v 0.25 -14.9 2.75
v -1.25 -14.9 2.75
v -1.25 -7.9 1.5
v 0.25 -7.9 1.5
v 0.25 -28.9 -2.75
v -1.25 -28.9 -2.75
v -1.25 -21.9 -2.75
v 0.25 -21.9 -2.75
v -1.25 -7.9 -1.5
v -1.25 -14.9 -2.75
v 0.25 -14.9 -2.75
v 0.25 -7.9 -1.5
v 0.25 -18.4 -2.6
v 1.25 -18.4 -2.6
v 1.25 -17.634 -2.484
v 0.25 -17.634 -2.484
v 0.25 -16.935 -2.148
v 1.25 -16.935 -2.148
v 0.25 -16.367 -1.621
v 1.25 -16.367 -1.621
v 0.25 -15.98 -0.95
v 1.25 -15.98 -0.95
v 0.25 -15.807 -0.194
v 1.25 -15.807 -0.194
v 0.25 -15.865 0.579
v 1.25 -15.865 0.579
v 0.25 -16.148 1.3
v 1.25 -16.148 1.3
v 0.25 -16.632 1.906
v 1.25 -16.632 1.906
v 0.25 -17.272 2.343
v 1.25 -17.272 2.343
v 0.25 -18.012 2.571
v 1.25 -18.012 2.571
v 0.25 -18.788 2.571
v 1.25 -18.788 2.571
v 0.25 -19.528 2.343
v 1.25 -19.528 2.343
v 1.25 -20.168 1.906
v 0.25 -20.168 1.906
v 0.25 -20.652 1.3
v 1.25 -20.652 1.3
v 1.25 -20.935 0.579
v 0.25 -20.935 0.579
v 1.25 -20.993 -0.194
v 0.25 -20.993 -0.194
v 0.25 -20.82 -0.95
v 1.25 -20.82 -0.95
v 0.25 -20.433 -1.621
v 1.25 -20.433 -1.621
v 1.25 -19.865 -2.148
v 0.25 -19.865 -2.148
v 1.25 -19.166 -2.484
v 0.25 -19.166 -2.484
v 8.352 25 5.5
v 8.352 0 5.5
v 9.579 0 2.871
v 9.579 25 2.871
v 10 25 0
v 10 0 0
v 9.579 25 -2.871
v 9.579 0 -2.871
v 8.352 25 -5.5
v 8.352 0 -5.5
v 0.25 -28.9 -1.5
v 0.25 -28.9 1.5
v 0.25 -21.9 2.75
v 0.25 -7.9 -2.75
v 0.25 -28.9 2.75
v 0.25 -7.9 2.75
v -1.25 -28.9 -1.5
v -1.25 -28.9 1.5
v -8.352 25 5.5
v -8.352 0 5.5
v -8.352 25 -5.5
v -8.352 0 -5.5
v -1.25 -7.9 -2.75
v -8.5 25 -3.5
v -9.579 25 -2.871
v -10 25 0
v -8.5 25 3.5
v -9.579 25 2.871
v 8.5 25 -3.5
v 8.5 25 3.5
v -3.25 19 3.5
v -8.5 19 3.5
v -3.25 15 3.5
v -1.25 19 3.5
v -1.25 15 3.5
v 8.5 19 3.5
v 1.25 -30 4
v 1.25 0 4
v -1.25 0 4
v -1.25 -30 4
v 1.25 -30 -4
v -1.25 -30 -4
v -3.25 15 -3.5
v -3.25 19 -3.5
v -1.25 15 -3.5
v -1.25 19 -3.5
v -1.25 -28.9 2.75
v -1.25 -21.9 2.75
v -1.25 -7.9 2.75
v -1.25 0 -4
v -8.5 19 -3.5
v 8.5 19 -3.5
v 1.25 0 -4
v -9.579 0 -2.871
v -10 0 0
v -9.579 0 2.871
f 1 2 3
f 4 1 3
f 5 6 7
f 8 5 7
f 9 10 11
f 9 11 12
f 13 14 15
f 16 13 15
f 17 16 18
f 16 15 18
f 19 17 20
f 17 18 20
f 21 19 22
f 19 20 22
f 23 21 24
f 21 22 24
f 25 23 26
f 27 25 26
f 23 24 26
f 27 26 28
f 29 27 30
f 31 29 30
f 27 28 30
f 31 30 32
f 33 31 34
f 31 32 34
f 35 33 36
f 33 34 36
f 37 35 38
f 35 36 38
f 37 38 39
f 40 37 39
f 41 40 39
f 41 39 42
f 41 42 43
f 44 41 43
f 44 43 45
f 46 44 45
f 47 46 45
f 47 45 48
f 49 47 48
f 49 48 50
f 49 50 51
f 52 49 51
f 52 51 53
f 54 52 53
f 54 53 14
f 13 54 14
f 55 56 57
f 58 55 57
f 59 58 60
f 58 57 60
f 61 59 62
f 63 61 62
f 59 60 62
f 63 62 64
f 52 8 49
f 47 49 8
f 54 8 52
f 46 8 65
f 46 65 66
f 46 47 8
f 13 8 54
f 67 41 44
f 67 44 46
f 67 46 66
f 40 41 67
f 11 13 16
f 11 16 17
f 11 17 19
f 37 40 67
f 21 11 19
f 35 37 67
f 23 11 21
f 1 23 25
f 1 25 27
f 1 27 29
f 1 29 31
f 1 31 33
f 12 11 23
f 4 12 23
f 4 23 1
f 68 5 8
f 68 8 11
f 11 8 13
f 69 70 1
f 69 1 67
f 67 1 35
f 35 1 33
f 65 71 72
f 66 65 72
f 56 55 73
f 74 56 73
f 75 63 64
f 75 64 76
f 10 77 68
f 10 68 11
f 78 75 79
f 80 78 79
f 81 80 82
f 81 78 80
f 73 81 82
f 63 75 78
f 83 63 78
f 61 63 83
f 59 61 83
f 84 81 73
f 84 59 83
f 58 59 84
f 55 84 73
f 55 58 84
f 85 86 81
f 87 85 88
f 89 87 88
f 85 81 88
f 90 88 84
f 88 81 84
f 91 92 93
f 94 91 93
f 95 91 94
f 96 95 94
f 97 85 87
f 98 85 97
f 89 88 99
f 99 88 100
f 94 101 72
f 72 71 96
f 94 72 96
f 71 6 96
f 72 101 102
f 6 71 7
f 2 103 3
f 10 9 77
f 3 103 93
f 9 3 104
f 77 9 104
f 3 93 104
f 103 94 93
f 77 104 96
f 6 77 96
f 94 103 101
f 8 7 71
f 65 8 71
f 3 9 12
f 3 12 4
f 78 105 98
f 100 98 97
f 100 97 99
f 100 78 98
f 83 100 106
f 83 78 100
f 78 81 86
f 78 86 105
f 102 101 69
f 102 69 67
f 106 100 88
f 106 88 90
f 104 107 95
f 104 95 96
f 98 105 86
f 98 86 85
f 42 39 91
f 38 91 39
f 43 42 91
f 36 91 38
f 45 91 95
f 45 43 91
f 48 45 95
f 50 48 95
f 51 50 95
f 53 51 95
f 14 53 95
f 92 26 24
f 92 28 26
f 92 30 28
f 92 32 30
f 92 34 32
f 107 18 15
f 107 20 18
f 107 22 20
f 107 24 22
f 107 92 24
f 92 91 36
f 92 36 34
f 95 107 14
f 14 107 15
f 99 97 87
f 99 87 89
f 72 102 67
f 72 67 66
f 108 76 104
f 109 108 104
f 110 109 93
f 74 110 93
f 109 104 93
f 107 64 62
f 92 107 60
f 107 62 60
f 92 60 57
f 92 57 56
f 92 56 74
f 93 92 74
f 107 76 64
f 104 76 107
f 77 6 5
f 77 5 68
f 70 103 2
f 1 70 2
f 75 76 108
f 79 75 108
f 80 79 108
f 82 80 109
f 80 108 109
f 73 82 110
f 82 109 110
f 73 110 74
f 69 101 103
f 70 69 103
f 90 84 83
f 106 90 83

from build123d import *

# Parameters (mm, degrees)
SKETCH3_R           = 10
BOSS_EXTRUDE1_DEPTH = 25
SKETCH4_W           = 2.5
SKETCH4_H           = 8
BOSS_EXTRUDE2_DEPTH = 30
CUT_EXTRUDE1_REACH  = 35.564
SKETCH5_R           = 2.6
SKETCH7_W           = 17
SKETCH7_H           = 7
CUT_EXTRUDE3_DEPTH  = 6
SKETCH8_W           = 2
SKETCH8_H           = 7
CUT_EXTRUDE4_DEPTH  = 4
SKETCH11_W          = 5.5
SKETCH11_H          = 21
CUT_EXTRUDE7_DEPTH  = 1.5
CUT_EXTRUDE5_DEPTH  = 43
BOSS_EXTRUDE3_DEPTH = 1.5


with BuildPart() as part:
    # Sketch3 → Boss-Extrude1 (new body)
    with BuildSketch(Plane(origin=(0, 0, 0), x_dir=(1, 0, 0), z_dir=(0, 1, 0))):
        with Locations(Location((0, 0, 0), (0, 0, 270))):
            Circle(SKETCH3_R)
    extrude(amount=BOSS_EXTRUDE1_DEPTH)

    # Sketch4 → Boss-Extrude2 (add)
    with BuildSketch(Plane(origin=(0, 0, 0), x_dir=(-1, 0, 0), z_dir=(0, -1, 0))):
        Rectangle(SKETCH4_W, SKETCH4_H)
    extrude(amount=BOSS_EXTRUDE2_DEPTH)

    # Sketch5 → Cut-Extrude1 (cut, up to next)
    with BuildSketch(Plane(origin=(1.25, 0, 0), x_dir=(0, 0, -1), z_dir=(1, 0, 0)), mode=Mode.PRIVATE) as cut_extrude1_sk1:
        with Locations((0, -18.4)):
            Circle(SKETCH5_R)
    cut_extrude1_tool1 = extrude(cut_extrude1_sk1.sketch, amount=-CUT_EXTRUDE1_REACH, mode=Mode.PRIVATE) & part.part
    add(cut_extrude1_tool1.solids().sort_by_distance((1.25, -18.4, 0))[0], mode=Mode.SUBTRACT)

    # Sketch7 → Cut-Extrude3 (cut)
    with BuildSketch(Plane(origin=(0, 25, 0), x_dir=(1, 0, 0), z_dir=(0, 1, 0))):
        Rectangle(SKETCH7_W, SKETCH7_H)
    extrude(amount=-CUT_EXTRUDE3_DEPTH, mode=Mode.SUBTRACT)

    # Sketch8 → Cut-Extrude4 (cut)
    with BuildSketch(Plane(origin=(0, 19, 0), x_dir=(1, 0, 0), z_dir=(0, 1, 0))):
        with Locations((-2.25, 0)):
            Rectangle(SKETCH8_W, SKETCH8_H)
    extrude(amount=-CUT_EXTRUDE4_DEPTH, mode=Mode.SUBTRACT)

    # Sketch11 → Cut-Extrude7 (cut)
    with BuildSketch(Plane.ZY.offset(1.25)):
        with Locations((0, -18.4)):
            Rectangle(SKETCH11_W, SKETCH11_H)
    extrude(amount=-CUT_EXTRUDE7_DEPTH, mode=Mode.SUBTRACT)

    # Sketch9 → Cut-Extrude5 (cut)
    with BuildSketch(Plane.XZ):
        with BuildLine():
            Line((8.351646544, -5.5), (-8.351646544, -5.5))
            ThreePointArc((-8.351646544, -5.5), (0, -10), (8.351646544, -5.5))
        make_face()
        with BuildLine():
            Line((8.351646544, 5.5), (-8.351646544, 5.5))
            ThreePointArc((-8.351646544, 5.5), (0, 10), (8.351646544, 5.5))
        make_face()
    extrude(amount=-CUT_EXTRUDE5_DEPTH, mode=Mode.SUBTRACT)

    # Sketch10 → Boss-Extrude3 (add)
    with BuildSketch(Plane.ZY.offset(1.25)):
        Polygon((-2.749970665, -28.900023923), (-2.749970665, -21.900023923), (-1.499970665, -28.900023923), align=None)
        Polygon((1.499970665, -28.900023923), (2.749970665, -28.900023923), (2.749970665, -21.900023923), align=None)
        Polygon((2.749970665, -7.899976077), (2.749970665, -14.899976077), (1.499970665, -7.899976077), align=None)
        Polygon((-1.499970665, -7.899976077), (-2.749970665, -7.899976077), (-2.749970665, -14.899976077), align=None)
    extrude(amount=-BOSS_EXTRUDE3_DEPTH)


solid = part.part
